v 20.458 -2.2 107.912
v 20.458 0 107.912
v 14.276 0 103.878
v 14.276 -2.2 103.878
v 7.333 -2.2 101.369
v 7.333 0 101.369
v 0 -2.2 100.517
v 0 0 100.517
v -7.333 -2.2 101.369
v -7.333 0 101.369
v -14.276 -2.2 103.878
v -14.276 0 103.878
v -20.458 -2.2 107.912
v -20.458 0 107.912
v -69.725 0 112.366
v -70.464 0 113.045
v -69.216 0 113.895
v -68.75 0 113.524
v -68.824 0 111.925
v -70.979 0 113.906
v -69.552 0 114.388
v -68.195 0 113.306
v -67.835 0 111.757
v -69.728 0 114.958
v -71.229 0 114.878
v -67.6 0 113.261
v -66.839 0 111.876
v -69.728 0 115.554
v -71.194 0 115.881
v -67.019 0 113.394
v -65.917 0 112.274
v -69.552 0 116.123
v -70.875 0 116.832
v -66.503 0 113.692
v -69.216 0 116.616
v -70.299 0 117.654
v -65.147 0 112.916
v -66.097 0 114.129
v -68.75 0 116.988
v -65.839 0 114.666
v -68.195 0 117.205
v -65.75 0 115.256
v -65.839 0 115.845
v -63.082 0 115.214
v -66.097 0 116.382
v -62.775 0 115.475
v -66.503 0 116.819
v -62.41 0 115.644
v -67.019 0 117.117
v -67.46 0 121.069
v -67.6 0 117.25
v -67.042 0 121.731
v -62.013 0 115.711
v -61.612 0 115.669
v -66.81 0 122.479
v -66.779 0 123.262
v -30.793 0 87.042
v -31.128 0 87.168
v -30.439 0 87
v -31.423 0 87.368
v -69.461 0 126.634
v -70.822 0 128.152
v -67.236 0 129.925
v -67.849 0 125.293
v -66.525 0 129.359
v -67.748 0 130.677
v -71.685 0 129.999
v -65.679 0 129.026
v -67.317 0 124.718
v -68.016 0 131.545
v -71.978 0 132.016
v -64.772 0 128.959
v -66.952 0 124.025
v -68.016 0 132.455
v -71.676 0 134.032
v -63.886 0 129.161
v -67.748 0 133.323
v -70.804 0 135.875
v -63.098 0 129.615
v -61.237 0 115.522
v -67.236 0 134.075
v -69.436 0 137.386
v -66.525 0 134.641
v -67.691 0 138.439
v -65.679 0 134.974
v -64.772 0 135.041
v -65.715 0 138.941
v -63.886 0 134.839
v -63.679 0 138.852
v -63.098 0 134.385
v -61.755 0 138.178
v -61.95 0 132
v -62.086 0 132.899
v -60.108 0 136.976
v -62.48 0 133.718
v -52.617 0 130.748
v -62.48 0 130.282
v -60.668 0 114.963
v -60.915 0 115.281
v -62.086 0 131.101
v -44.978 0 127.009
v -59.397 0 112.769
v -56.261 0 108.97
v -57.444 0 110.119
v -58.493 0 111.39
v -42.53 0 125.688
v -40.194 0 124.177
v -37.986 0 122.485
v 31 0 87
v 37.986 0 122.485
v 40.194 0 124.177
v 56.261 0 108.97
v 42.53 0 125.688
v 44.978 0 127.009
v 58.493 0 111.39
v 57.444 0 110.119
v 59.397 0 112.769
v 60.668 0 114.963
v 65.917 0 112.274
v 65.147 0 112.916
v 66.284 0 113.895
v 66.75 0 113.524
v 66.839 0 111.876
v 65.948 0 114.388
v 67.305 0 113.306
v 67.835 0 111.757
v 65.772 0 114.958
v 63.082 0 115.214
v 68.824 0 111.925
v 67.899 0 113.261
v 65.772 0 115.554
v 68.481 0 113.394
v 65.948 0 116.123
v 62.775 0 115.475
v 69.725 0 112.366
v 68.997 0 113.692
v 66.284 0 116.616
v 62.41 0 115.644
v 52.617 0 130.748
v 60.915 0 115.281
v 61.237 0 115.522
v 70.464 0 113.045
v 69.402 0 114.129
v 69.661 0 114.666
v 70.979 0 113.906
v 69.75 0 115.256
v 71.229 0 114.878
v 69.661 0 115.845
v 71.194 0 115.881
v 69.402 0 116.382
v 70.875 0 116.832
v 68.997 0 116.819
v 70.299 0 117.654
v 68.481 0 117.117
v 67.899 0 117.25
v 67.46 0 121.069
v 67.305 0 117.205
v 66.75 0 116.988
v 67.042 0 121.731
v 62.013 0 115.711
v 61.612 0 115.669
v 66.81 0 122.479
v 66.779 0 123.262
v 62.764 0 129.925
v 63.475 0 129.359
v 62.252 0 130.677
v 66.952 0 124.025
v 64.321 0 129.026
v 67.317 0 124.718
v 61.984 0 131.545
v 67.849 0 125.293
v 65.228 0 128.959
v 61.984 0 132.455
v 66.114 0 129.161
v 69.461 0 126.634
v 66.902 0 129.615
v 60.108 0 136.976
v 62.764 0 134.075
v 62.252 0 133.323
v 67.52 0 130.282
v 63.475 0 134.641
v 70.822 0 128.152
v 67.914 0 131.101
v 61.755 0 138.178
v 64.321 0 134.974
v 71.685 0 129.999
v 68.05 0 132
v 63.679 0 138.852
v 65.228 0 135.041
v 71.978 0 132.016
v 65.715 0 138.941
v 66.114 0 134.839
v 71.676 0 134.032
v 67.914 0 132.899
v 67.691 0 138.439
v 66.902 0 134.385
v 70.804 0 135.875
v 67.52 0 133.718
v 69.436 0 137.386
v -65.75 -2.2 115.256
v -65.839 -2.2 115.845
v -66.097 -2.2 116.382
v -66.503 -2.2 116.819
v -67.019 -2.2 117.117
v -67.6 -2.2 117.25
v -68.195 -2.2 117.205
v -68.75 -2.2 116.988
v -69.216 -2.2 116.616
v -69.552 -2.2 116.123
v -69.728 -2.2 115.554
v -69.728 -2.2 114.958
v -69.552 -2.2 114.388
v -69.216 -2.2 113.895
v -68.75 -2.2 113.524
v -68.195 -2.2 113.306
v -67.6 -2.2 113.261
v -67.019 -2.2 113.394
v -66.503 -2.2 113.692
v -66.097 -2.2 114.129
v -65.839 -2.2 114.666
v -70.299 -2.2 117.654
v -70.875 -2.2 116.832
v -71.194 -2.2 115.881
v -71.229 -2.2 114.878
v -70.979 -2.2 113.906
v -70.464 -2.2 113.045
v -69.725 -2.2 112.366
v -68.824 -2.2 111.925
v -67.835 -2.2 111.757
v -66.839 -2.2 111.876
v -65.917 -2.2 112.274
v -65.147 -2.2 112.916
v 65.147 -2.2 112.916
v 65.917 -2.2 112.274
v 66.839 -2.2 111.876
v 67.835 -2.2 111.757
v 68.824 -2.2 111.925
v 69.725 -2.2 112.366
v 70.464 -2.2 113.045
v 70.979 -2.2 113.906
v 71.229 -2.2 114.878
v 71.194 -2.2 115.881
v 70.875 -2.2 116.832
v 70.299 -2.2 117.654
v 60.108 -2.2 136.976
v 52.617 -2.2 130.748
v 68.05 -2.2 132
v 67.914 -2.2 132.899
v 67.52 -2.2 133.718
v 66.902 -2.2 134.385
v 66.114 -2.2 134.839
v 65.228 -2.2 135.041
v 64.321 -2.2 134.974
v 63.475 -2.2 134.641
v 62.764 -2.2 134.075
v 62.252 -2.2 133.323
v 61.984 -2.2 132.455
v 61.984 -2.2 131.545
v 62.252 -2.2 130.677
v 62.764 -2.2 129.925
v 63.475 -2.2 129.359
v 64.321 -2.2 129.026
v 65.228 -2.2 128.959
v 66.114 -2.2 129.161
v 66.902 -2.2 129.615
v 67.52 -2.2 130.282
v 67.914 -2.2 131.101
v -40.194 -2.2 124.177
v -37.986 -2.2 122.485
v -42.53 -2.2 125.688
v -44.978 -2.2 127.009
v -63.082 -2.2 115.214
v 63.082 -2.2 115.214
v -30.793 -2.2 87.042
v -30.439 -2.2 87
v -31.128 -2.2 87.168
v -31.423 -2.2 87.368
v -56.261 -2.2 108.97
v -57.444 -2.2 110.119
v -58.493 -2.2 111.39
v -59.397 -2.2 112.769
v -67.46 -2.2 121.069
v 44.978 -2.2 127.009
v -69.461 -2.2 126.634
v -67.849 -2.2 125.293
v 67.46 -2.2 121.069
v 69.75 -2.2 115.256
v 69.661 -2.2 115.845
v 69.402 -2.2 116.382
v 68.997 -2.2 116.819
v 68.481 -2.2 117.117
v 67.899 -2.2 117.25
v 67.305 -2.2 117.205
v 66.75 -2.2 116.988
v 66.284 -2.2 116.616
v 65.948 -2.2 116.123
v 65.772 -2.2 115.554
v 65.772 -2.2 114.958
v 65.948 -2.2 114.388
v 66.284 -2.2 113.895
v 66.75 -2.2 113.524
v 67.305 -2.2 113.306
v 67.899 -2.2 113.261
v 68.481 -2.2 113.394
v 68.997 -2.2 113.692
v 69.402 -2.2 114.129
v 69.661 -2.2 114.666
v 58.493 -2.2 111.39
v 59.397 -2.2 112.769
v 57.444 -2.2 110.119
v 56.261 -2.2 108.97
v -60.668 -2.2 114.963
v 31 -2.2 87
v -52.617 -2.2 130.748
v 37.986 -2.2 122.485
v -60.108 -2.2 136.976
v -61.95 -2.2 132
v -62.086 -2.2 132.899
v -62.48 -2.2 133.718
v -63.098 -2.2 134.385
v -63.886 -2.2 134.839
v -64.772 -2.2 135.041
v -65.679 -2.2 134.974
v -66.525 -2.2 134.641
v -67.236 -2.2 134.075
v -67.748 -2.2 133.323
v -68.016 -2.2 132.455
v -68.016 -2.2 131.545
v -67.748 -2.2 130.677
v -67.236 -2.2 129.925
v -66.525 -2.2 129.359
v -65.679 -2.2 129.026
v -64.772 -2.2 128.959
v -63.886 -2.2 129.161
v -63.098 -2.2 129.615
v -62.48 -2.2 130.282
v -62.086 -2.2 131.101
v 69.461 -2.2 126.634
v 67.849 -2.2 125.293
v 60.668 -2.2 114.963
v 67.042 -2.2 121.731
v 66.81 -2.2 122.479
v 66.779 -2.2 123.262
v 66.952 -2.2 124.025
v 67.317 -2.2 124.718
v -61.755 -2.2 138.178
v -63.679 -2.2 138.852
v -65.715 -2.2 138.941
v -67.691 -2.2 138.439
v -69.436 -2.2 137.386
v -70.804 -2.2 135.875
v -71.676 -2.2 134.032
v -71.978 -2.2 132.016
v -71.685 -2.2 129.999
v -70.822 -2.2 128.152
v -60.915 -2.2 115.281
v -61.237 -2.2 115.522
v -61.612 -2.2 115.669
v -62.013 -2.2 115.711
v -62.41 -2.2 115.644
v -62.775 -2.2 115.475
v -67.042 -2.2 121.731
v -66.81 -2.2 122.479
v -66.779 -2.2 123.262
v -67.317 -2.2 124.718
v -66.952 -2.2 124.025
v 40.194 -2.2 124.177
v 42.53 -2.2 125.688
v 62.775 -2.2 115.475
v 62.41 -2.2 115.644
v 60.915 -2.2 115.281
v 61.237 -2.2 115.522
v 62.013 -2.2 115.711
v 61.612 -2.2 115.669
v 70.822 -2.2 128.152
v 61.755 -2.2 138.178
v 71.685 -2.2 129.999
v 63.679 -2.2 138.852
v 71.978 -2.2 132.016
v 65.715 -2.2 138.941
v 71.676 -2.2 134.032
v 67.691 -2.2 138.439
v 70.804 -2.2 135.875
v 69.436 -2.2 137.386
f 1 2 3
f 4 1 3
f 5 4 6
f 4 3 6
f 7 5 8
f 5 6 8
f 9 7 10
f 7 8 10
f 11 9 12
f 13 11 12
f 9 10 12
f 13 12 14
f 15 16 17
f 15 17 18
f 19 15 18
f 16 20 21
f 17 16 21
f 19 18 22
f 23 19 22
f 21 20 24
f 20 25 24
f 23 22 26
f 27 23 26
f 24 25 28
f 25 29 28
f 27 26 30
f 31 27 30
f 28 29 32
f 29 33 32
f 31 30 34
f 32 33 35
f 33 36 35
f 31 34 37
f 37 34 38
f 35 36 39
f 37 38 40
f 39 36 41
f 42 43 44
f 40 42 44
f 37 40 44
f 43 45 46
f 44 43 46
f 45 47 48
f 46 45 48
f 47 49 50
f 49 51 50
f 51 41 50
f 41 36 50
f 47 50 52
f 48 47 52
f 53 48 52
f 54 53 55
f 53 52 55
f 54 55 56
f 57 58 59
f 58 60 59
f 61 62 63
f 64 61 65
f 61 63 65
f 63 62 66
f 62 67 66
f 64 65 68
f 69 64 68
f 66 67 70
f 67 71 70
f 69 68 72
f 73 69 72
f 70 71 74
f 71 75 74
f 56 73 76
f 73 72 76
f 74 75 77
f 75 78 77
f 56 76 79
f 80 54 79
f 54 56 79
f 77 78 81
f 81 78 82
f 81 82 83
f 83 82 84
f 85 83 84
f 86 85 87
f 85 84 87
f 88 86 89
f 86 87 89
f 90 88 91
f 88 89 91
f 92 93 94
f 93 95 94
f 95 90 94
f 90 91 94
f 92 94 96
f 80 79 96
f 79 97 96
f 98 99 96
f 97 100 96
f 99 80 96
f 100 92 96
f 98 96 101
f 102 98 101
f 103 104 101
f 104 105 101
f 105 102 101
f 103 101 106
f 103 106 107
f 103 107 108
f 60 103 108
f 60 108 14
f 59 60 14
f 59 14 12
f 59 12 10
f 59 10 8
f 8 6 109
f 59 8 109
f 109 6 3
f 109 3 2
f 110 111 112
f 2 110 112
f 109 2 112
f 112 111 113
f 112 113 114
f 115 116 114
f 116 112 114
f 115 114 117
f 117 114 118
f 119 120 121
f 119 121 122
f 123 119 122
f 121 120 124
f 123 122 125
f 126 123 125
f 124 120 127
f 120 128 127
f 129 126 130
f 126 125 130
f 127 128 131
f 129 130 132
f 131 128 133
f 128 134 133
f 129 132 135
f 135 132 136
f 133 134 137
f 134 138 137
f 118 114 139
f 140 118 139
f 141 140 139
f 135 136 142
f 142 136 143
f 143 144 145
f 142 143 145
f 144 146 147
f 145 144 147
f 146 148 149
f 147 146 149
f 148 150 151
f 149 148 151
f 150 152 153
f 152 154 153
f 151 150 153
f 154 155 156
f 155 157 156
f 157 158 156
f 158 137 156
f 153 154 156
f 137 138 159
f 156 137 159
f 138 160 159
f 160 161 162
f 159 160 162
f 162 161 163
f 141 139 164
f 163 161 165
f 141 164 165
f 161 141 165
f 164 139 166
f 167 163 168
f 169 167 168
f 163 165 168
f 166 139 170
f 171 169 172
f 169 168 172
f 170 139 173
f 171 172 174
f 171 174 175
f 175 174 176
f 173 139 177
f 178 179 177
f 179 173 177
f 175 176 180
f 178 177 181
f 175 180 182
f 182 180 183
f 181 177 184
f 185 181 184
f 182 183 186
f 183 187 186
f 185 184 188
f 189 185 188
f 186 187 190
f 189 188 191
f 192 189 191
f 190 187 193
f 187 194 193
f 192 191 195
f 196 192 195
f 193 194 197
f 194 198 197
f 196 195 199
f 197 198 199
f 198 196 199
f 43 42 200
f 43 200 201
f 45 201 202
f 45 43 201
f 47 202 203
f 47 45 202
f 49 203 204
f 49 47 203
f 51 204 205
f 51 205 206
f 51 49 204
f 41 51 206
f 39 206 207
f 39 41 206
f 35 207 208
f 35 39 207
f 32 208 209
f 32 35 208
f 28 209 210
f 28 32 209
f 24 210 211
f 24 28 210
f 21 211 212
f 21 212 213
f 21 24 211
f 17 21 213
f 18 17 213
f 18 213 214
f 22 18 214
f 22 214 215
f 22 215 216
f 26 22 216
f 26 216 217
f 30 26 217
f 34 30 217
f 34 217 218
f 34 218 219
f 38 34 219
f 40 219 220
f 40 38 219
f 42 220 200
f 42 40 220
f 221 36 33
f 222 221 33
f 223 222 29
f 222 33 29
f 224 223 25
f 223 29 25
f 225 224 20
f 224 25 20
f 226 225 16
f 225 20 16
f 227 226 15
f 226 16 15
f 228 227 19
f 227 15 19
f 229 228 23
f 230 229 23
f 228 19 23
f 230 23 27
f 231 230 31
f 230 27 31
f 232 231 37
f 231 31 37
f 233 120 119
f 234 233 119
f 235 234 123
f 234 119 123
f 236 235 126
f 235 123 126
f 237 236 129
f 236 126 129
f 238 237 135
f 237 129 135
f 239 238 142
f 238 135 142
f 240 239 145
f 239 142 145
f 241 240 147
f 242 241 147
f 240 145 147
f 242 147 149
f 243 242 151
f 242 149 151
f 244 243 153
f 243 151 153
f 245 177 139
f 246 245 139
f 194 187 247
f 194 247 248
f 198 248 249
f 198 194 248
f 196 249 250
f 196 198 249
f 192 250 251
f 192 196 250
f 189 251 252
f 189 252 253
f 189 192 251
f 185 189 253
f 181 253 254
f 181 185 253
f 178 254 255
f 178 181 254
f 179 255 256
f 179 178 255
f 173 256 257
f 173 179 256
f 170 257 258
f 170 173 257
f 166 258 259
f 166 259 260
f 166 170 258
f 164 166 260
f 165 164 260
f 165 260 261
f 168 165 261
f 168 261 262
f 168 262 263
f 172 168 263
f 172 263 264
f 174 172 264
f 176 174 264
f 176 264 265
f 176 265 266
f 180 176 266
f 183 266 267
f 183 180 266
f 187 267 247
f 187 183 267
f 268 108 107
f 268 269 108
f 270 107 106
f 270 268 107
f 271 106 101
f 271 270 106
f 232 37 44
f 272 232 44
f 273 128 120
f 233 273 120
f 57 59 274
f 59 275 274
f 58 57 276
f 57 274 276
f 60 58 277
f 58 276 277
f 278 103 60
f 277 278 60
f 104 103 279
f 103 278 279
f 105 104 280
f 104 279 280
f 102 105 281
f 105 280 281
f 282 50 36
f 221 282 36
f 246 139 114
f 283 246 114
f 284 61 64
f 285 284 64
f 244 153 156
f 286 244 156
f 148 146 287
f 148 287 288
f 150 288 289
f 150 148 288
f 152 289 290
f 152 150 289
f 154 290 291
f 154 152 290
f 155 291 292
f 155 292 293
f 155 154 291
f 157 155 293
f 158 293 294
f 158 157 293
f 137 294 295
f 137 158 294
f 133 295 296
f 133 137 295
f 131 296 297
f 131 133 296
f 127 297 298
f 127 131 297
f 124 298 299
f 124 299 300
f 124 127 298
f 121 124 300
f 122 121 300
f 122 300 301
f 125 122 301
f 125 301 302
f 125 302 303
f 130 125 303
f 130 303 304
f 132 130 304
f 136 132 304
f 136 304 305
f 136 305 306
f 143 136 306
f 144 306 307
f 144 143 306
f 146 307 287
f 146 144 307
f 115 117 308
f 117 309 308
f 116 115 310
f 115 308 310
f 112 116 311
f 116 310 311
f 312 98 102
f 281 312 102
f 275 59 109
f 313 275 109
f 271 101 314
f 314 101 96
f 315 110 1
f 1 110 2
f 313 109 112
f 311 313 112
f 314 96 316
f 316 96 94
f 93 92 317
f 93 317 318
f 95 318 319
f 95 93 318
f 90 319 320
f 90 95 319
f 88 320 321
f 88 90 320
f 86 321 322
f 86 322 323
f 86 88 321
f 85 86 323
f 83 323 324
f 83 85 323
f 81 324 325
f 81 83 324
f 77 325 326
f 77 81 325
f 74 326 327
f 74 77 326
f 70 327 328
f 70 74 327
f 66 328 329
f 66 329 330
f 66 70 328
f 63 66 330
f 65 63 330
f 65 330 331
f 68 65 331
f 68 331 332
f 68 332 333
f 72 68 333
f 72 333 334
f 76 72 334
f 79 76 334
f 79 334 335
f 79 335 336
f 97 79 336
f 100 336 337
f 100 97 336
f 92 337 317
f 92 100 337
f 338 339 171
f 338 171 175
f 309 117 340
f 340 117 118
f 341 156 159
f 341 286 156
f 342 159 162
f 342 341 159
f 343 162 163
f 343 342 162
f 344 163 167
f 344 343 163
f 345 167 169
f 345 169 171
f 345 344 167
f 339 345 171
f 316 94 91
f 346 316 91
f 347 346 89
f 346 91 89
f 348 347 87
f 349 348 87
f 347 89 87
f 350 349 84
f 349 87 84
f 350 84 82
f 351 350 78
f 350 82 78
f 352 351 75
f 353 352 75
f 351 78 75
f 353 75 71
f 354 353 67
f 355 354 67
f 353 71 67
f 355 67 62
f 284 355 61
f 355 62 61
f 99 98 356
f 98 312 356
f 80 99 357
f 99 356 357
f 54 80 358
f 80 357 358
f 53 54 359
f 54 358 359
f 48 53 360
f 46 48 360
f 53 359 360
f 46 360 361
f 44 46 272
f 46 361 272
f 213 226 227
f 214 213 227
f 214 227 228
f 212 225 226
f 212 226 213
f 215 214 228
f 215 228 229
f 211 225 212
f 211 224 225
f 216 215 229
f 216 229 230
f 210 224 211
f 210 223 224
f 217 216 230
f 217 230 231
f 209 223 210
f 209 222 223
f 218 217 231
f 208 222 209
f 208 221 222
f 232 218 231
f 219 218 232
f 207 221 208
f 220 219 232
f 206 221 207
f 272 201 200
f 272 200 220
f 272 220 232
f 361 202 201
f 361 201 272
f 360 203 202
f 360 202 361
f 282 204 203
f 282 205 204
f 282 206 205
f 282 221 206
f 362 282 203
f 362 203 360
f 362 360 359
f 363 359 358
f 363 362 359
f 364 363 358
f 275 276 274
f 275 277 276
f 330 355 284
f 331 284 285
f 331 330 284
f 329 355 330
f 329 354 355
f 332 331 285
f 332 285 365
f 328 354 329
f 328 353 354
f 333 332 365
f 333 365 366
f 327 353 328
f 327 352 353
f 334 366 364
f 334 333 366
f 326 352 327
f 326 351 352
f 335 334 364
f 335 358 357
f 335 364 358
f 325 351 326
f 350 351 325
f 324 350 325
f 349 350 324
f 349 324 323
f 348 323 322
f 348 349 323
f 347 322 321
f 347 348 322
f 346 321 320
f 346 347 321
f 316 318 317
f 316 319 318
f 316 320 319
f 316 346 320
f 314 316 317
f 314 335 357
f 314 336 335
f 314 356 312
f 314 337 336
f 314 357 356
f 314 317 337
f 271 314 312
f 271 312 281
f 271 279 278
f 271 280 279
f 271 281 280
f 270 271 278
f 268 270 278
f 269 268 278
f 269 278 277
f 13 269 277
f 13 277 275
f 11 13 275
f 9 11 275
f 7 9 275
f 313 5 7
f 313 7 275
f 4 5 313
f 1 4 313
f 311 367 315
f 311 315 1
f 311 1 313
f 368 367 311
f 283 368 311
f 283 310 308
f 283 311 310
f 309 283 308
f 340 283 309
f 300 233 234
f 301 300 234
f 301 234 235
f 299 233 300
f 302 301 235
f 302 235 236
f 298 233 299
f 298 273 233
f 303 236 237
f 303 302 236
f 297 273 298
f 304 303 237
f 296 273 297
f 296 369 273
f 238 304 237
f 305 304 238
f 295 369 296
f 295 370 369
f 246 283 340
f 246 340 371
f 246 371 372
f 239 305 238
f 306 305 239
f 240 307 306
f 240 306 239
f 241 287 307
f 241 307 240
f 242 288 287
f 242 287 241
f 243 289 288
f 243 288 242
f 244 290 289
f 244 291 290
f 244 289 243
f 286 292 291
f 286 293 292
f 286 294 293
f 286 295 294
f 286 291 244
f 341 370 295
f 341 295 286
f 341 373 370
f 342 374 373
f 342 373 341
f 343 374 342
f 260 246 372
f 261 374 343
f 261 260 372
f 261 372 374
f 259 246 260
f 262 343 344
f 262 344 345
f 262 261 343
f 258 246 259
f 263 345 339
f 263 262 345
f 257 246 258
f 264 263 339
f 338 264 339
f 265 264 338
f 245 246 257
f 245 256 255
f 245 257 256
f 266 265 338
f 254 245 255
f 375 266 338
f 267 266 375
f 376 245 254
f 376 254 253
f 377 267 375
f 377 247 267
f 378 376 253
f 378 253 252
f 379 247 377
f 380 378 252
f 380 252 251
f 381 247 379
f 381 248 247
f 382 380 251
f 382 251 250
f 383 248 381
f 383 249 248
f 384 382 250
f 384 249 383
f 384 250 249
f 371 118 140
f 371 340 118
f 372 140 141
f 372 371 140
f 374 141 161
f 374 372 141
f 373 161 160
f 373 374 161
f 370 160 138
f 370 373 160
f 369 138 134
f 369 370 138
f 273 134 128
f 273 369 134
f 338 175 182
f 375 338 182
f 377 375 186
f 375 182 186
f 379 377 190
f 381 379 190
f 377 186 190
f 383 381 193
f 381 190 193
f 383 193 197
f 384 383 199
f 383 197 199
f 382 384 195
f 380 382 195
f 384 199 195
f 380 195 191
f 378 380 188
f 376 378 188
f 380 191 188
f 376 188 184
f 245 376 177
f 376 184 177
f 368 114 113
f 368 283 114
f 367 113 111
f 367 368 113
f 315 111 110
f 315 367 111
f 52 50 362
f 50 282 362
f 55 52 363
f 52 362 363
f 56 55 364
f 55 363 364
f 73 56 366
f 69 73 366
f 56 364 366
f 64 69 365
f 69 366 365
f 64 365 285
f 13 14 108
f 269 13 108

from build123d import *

# Parameters (mm, degrees)
F0_R     = 2
F0_R_2   = 3.05
F1_DEPTH = 2.2
F2_R     = 35
F3_R     = 15
F4_R     = 1.5
F5_R     = 3


with BuildPart() as f1:
    # F0 (on Front) → F1 (new body)
    with BuildSketch(Plane.XZ):
        with BuildLine():
            Line((52.6173001252, 130.7482583531), (41.2109028752, 125.1659909507))
            Line((41.2109028752, 125.1659909507), (20.4584298604, 107.9115033818))
            ThreePointArc((20.4584298604, 107.9115033818), (0, 100.5174507858), (-20.4584298604, 107.9115033818))
            Line((-20.4584298604, 107.9115033818), (-41.2109028752, 125.1659909507))
            Line((-41.2109028752, 125.1659909507), (-52.6173001252, 130.7482583531))
            Line((-52.6173001252, 130.7482583531), (-60.1081627094, 136.9764796956))
            ThreePointArc((-60.1081627094, 136.9764796956), (-70.17561569, 136.6806435954), (-69.4613509604, 126.6342037081))
            Line((-69.4613509604, 126.6342037081), (-65.5419625699, 123.3754577161))
            Line((-65.5419625699, 123.3754577161), (-70.2992250124, 117.6537600959))
            ThreePointArc((-70.2992250124, 117.6537600959), (-70.1188602171, 112.67914718), (-65.1466267703, 112.9162118817))
            Line((-65.1466267703, 112.9162118817), (-61.7026267828, 116.7487230653))
            Line((-61.7026267828, 116.7487230653), (-58.1451833135, 110.6085375713))
            Line((-58.1451833134, 110.6085375713), (-31, 87))
            Line((-31, 87), (31, 87))
            Line((31, 87), (58.1451833134, 110.6085375713))
            Line((58.1451833135, 110.6085375713), (61.7026267828, 116.7487230653))
            Line((61.7026267828, 116.7487230653), (65.1466267703, 112.9162118817))
            ThreePointArc((65.1466267703, 112.9162118817), (70.1188602171, 112.67914718), (70.2992250124, 117.6537600959))
            Line((70.2992250124, 117.6537600959), (65.5419625699, 123.3754577161))
            Line((65.5419625699, 123.3754577161), (69.4613509604, 126.6342037081))
            ThreePointArc((69.4613509604, 126.6342037081), (70.17561569, 136.6806435954), (60.1081627094, 136.9764796956))
            Line((60.1081627094, 136.9764796956), (52.6173001252, 130.7482583531))
        make_face()
        with Locations((-67.7499321664, 115.2556137314)):
            Circle(F0_R, mode=Mode.SUBTRACT)
        with Locations((-65, 132)):
            Circle(F0_R_2, mode=Mode.SUBTRACT)
        with Locations((67.7499321664, 115.2556137314)):
            Circle(F0_R, mode=Mode.SUBTRACT)
        with Locations((65, 132)):
            Circle(F0_R_2, mode=Mode.SUBTRACT)
    extrude(amount=F1_DEPTH)

    # F2
    f2_edges = [f1.edges().sort_by_distance(p)[0] for p in [
        (41.210903, -1.1, 125.165991),
        (-41.210903, -1.1, 125.165991),
    ]]
    fillet(f2_edges, radius=F2_R)

    # F3
    f3_edges = [f1.edges().sort_by_distance(p)[0] for p in [
        (58.145183, -1.1, 110.608538),
        (-58.145183, -1.1, 110.608538),
    ]]
    fillet(f3_edges, radius=F3_R)

    # F4
    f4_edges = [f1.edges().sort_by_distance(p)[0] for p in [
        (-61.702627, -1.1, 116.748723),
        (61.702627, -1.1, 116.748723),
        (-31, -1.1, 87),
    ]]
    fillet(f4_edges, radius=F4_R)

    # F5
    f5_edges = [f1.edges().sort_by_distance(p)[0] for p in [
        (65.541963, -1.1, 123.375458),
        (-65.541963, -1.1, 123.375458),
    ]]
    fillet(f5_edges, radius=F5_R)


solid = f1.part
